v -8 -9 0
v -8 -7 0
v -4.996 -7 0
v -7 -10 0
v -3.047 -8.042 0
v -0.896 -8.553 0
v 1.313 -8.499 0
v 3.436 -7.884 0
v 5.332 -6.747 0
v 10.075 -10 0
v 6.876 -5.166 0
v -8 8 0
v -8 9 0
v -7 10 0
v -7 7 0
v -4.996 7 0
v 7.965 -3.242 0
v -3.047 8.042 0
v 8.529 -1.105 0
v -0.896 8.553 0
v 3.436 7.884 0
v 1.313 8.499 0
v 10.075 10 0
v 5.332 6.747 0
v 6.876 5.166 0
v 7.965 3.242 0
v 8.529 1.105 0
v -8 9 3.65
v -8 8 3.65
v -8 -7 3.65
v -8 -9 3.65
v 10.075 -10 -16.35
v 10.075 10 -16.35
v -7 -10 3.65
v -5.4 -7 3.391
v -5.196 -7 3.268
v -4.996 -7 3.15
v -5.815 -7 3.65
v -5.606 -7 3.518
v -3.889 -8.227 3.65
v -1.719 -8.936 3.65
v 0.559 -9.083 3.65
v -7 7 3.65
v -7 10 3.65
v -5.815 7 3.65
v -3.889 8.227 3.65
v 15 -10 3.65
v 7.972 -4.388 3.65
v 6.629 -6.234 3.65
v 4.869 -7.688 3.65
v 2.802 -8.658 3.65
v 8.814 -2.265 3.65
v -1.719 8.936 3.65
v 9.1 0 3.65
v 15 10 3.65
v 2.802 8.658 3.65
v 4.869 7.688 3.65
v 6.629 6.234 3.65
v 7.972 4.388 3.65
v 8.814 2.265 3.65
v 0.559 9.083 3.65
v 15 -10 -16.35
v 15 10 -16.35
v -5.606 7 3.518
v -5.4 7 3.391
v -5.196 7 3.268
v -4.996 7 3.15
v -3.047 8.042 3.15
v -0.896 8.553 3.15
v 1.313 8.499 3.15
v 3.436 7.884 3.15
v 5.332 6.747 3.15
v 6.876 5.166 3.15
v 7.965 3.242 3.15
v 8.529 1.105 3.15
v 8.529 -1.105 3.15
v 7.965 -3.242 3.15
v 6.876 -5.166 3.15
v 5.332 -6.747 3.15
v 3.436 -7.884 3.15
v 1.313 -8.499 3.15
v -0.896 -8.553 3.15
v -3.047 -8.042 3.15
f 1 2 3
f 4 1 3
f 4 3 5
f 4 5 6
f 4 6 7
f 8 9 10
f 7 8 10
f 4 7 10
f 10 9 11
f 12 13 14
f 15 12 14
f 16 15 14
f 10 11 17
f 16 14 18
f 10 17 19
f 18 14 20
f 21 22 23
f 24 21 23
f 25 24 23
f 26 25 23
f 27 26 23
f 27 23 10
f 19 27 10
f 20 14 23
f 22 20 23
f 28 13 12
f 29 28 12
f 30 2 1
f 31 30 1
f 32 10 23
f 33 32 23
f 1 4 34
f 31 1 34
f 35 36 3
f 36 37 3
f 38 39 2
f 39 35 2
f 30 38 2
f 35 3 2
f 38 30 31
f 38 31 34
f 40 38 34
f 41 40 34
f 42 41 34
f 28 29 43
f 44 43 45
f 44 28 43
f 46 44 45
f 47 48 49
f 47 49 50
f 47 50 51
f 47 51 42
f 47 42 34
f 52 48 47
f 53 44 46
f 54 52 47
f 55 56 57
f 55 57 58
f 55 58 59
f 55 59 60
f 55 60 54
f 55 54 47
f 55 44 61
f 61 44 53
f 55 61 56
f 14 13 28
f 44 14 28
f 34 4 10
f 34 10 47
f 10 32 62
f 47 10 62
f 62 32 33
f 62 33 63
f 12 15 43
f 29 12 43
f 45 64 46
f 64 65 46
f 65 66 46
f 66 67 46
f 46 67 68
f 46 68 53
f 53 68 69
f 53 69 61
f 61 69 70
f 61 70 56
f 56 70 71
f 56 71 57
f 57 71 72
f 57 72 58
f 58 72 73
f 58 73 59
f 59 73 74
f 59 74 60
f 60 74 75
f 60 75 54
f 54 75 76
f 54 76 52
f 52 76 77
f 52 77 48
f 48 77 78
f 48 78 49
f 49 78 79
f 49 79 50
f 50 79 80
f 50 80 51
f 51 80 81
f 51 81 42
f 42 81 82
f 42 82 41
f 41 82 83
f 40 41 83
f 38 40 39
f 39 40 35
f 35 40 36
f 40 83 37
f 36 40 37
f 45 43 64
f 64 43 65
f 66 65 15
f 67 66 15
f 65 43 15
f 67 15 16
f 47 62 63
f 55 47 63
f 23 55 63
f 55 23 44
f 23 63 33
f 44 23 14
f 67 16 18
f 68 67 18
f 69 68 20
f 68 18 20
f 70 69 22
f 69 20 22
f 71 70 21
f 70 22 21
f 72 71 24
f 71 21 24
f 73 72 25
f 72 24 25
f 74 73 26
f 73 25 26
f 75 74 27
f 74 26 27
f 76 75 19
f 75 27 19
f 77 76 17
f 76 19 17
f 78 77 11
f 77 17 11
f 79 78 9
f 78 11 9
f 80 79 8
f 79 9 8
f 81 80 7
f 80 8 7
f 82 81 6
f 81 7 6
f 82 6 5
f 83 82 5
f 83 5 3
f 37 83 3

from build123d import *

# Parameters (mm, degrees)
F1_DEPTH = 3.65
F2_SIZE  = 1
F3_SIZE  = 0.5
F4_W     = 4.925
F4_H     = 20
F5_DEPTH = 20


with BuildPart() as f1:
    # F0 (on Top) → F1 (new body)
    with BuildSketch(Plane.XY):
        with BuildLine():
            ThreePointArc((-4.9959983987, 7), (8.6, 0), (-4.9959983987, -7))
            Line((-4.9959983987, -7), (-8, -7))
            Line((-8, -7), (-8, -10))
            Line((-8, -10), (8, -10))
            Line((8, -10), (15, -10))
            Line((15, -10), (15, 10))
            Line((15, 10), (8, 10))
            Line((8, 10), (-8, 10))
            Line((-8, 10), (-8, 7))
            Line((-8, 7), (-4.9959983987, 7))
        make_face()
    extrude(amount=F1_DEPTH)

    # F2
    f2_edges = [f1.edges().sort_by_distance(p)[0] for p in [
        (-8, 10, 1.825),
        (-8, 7, 1.825),
        (-8, -10, 1.825),
    ]]
    chamfer(f2_edges, length=F2_SIZE)

    # F3
    f3_edges = [f1.edges().sort_by_distance(p)[0] for p in [
        (8.6, 0, 3.65),
    ]]
    chamfer(f3_edges, length=F3_SIZE)

    # F4 (on face) → F5 (join)
    with BuildSketch(Plane.XY.offset(3.65)):
        with Locations((12.5375, 0)):
            Rectangle(F4_W, F4_H)
    extrude(amount=-F5_DEPTH)


solid = f1.part
